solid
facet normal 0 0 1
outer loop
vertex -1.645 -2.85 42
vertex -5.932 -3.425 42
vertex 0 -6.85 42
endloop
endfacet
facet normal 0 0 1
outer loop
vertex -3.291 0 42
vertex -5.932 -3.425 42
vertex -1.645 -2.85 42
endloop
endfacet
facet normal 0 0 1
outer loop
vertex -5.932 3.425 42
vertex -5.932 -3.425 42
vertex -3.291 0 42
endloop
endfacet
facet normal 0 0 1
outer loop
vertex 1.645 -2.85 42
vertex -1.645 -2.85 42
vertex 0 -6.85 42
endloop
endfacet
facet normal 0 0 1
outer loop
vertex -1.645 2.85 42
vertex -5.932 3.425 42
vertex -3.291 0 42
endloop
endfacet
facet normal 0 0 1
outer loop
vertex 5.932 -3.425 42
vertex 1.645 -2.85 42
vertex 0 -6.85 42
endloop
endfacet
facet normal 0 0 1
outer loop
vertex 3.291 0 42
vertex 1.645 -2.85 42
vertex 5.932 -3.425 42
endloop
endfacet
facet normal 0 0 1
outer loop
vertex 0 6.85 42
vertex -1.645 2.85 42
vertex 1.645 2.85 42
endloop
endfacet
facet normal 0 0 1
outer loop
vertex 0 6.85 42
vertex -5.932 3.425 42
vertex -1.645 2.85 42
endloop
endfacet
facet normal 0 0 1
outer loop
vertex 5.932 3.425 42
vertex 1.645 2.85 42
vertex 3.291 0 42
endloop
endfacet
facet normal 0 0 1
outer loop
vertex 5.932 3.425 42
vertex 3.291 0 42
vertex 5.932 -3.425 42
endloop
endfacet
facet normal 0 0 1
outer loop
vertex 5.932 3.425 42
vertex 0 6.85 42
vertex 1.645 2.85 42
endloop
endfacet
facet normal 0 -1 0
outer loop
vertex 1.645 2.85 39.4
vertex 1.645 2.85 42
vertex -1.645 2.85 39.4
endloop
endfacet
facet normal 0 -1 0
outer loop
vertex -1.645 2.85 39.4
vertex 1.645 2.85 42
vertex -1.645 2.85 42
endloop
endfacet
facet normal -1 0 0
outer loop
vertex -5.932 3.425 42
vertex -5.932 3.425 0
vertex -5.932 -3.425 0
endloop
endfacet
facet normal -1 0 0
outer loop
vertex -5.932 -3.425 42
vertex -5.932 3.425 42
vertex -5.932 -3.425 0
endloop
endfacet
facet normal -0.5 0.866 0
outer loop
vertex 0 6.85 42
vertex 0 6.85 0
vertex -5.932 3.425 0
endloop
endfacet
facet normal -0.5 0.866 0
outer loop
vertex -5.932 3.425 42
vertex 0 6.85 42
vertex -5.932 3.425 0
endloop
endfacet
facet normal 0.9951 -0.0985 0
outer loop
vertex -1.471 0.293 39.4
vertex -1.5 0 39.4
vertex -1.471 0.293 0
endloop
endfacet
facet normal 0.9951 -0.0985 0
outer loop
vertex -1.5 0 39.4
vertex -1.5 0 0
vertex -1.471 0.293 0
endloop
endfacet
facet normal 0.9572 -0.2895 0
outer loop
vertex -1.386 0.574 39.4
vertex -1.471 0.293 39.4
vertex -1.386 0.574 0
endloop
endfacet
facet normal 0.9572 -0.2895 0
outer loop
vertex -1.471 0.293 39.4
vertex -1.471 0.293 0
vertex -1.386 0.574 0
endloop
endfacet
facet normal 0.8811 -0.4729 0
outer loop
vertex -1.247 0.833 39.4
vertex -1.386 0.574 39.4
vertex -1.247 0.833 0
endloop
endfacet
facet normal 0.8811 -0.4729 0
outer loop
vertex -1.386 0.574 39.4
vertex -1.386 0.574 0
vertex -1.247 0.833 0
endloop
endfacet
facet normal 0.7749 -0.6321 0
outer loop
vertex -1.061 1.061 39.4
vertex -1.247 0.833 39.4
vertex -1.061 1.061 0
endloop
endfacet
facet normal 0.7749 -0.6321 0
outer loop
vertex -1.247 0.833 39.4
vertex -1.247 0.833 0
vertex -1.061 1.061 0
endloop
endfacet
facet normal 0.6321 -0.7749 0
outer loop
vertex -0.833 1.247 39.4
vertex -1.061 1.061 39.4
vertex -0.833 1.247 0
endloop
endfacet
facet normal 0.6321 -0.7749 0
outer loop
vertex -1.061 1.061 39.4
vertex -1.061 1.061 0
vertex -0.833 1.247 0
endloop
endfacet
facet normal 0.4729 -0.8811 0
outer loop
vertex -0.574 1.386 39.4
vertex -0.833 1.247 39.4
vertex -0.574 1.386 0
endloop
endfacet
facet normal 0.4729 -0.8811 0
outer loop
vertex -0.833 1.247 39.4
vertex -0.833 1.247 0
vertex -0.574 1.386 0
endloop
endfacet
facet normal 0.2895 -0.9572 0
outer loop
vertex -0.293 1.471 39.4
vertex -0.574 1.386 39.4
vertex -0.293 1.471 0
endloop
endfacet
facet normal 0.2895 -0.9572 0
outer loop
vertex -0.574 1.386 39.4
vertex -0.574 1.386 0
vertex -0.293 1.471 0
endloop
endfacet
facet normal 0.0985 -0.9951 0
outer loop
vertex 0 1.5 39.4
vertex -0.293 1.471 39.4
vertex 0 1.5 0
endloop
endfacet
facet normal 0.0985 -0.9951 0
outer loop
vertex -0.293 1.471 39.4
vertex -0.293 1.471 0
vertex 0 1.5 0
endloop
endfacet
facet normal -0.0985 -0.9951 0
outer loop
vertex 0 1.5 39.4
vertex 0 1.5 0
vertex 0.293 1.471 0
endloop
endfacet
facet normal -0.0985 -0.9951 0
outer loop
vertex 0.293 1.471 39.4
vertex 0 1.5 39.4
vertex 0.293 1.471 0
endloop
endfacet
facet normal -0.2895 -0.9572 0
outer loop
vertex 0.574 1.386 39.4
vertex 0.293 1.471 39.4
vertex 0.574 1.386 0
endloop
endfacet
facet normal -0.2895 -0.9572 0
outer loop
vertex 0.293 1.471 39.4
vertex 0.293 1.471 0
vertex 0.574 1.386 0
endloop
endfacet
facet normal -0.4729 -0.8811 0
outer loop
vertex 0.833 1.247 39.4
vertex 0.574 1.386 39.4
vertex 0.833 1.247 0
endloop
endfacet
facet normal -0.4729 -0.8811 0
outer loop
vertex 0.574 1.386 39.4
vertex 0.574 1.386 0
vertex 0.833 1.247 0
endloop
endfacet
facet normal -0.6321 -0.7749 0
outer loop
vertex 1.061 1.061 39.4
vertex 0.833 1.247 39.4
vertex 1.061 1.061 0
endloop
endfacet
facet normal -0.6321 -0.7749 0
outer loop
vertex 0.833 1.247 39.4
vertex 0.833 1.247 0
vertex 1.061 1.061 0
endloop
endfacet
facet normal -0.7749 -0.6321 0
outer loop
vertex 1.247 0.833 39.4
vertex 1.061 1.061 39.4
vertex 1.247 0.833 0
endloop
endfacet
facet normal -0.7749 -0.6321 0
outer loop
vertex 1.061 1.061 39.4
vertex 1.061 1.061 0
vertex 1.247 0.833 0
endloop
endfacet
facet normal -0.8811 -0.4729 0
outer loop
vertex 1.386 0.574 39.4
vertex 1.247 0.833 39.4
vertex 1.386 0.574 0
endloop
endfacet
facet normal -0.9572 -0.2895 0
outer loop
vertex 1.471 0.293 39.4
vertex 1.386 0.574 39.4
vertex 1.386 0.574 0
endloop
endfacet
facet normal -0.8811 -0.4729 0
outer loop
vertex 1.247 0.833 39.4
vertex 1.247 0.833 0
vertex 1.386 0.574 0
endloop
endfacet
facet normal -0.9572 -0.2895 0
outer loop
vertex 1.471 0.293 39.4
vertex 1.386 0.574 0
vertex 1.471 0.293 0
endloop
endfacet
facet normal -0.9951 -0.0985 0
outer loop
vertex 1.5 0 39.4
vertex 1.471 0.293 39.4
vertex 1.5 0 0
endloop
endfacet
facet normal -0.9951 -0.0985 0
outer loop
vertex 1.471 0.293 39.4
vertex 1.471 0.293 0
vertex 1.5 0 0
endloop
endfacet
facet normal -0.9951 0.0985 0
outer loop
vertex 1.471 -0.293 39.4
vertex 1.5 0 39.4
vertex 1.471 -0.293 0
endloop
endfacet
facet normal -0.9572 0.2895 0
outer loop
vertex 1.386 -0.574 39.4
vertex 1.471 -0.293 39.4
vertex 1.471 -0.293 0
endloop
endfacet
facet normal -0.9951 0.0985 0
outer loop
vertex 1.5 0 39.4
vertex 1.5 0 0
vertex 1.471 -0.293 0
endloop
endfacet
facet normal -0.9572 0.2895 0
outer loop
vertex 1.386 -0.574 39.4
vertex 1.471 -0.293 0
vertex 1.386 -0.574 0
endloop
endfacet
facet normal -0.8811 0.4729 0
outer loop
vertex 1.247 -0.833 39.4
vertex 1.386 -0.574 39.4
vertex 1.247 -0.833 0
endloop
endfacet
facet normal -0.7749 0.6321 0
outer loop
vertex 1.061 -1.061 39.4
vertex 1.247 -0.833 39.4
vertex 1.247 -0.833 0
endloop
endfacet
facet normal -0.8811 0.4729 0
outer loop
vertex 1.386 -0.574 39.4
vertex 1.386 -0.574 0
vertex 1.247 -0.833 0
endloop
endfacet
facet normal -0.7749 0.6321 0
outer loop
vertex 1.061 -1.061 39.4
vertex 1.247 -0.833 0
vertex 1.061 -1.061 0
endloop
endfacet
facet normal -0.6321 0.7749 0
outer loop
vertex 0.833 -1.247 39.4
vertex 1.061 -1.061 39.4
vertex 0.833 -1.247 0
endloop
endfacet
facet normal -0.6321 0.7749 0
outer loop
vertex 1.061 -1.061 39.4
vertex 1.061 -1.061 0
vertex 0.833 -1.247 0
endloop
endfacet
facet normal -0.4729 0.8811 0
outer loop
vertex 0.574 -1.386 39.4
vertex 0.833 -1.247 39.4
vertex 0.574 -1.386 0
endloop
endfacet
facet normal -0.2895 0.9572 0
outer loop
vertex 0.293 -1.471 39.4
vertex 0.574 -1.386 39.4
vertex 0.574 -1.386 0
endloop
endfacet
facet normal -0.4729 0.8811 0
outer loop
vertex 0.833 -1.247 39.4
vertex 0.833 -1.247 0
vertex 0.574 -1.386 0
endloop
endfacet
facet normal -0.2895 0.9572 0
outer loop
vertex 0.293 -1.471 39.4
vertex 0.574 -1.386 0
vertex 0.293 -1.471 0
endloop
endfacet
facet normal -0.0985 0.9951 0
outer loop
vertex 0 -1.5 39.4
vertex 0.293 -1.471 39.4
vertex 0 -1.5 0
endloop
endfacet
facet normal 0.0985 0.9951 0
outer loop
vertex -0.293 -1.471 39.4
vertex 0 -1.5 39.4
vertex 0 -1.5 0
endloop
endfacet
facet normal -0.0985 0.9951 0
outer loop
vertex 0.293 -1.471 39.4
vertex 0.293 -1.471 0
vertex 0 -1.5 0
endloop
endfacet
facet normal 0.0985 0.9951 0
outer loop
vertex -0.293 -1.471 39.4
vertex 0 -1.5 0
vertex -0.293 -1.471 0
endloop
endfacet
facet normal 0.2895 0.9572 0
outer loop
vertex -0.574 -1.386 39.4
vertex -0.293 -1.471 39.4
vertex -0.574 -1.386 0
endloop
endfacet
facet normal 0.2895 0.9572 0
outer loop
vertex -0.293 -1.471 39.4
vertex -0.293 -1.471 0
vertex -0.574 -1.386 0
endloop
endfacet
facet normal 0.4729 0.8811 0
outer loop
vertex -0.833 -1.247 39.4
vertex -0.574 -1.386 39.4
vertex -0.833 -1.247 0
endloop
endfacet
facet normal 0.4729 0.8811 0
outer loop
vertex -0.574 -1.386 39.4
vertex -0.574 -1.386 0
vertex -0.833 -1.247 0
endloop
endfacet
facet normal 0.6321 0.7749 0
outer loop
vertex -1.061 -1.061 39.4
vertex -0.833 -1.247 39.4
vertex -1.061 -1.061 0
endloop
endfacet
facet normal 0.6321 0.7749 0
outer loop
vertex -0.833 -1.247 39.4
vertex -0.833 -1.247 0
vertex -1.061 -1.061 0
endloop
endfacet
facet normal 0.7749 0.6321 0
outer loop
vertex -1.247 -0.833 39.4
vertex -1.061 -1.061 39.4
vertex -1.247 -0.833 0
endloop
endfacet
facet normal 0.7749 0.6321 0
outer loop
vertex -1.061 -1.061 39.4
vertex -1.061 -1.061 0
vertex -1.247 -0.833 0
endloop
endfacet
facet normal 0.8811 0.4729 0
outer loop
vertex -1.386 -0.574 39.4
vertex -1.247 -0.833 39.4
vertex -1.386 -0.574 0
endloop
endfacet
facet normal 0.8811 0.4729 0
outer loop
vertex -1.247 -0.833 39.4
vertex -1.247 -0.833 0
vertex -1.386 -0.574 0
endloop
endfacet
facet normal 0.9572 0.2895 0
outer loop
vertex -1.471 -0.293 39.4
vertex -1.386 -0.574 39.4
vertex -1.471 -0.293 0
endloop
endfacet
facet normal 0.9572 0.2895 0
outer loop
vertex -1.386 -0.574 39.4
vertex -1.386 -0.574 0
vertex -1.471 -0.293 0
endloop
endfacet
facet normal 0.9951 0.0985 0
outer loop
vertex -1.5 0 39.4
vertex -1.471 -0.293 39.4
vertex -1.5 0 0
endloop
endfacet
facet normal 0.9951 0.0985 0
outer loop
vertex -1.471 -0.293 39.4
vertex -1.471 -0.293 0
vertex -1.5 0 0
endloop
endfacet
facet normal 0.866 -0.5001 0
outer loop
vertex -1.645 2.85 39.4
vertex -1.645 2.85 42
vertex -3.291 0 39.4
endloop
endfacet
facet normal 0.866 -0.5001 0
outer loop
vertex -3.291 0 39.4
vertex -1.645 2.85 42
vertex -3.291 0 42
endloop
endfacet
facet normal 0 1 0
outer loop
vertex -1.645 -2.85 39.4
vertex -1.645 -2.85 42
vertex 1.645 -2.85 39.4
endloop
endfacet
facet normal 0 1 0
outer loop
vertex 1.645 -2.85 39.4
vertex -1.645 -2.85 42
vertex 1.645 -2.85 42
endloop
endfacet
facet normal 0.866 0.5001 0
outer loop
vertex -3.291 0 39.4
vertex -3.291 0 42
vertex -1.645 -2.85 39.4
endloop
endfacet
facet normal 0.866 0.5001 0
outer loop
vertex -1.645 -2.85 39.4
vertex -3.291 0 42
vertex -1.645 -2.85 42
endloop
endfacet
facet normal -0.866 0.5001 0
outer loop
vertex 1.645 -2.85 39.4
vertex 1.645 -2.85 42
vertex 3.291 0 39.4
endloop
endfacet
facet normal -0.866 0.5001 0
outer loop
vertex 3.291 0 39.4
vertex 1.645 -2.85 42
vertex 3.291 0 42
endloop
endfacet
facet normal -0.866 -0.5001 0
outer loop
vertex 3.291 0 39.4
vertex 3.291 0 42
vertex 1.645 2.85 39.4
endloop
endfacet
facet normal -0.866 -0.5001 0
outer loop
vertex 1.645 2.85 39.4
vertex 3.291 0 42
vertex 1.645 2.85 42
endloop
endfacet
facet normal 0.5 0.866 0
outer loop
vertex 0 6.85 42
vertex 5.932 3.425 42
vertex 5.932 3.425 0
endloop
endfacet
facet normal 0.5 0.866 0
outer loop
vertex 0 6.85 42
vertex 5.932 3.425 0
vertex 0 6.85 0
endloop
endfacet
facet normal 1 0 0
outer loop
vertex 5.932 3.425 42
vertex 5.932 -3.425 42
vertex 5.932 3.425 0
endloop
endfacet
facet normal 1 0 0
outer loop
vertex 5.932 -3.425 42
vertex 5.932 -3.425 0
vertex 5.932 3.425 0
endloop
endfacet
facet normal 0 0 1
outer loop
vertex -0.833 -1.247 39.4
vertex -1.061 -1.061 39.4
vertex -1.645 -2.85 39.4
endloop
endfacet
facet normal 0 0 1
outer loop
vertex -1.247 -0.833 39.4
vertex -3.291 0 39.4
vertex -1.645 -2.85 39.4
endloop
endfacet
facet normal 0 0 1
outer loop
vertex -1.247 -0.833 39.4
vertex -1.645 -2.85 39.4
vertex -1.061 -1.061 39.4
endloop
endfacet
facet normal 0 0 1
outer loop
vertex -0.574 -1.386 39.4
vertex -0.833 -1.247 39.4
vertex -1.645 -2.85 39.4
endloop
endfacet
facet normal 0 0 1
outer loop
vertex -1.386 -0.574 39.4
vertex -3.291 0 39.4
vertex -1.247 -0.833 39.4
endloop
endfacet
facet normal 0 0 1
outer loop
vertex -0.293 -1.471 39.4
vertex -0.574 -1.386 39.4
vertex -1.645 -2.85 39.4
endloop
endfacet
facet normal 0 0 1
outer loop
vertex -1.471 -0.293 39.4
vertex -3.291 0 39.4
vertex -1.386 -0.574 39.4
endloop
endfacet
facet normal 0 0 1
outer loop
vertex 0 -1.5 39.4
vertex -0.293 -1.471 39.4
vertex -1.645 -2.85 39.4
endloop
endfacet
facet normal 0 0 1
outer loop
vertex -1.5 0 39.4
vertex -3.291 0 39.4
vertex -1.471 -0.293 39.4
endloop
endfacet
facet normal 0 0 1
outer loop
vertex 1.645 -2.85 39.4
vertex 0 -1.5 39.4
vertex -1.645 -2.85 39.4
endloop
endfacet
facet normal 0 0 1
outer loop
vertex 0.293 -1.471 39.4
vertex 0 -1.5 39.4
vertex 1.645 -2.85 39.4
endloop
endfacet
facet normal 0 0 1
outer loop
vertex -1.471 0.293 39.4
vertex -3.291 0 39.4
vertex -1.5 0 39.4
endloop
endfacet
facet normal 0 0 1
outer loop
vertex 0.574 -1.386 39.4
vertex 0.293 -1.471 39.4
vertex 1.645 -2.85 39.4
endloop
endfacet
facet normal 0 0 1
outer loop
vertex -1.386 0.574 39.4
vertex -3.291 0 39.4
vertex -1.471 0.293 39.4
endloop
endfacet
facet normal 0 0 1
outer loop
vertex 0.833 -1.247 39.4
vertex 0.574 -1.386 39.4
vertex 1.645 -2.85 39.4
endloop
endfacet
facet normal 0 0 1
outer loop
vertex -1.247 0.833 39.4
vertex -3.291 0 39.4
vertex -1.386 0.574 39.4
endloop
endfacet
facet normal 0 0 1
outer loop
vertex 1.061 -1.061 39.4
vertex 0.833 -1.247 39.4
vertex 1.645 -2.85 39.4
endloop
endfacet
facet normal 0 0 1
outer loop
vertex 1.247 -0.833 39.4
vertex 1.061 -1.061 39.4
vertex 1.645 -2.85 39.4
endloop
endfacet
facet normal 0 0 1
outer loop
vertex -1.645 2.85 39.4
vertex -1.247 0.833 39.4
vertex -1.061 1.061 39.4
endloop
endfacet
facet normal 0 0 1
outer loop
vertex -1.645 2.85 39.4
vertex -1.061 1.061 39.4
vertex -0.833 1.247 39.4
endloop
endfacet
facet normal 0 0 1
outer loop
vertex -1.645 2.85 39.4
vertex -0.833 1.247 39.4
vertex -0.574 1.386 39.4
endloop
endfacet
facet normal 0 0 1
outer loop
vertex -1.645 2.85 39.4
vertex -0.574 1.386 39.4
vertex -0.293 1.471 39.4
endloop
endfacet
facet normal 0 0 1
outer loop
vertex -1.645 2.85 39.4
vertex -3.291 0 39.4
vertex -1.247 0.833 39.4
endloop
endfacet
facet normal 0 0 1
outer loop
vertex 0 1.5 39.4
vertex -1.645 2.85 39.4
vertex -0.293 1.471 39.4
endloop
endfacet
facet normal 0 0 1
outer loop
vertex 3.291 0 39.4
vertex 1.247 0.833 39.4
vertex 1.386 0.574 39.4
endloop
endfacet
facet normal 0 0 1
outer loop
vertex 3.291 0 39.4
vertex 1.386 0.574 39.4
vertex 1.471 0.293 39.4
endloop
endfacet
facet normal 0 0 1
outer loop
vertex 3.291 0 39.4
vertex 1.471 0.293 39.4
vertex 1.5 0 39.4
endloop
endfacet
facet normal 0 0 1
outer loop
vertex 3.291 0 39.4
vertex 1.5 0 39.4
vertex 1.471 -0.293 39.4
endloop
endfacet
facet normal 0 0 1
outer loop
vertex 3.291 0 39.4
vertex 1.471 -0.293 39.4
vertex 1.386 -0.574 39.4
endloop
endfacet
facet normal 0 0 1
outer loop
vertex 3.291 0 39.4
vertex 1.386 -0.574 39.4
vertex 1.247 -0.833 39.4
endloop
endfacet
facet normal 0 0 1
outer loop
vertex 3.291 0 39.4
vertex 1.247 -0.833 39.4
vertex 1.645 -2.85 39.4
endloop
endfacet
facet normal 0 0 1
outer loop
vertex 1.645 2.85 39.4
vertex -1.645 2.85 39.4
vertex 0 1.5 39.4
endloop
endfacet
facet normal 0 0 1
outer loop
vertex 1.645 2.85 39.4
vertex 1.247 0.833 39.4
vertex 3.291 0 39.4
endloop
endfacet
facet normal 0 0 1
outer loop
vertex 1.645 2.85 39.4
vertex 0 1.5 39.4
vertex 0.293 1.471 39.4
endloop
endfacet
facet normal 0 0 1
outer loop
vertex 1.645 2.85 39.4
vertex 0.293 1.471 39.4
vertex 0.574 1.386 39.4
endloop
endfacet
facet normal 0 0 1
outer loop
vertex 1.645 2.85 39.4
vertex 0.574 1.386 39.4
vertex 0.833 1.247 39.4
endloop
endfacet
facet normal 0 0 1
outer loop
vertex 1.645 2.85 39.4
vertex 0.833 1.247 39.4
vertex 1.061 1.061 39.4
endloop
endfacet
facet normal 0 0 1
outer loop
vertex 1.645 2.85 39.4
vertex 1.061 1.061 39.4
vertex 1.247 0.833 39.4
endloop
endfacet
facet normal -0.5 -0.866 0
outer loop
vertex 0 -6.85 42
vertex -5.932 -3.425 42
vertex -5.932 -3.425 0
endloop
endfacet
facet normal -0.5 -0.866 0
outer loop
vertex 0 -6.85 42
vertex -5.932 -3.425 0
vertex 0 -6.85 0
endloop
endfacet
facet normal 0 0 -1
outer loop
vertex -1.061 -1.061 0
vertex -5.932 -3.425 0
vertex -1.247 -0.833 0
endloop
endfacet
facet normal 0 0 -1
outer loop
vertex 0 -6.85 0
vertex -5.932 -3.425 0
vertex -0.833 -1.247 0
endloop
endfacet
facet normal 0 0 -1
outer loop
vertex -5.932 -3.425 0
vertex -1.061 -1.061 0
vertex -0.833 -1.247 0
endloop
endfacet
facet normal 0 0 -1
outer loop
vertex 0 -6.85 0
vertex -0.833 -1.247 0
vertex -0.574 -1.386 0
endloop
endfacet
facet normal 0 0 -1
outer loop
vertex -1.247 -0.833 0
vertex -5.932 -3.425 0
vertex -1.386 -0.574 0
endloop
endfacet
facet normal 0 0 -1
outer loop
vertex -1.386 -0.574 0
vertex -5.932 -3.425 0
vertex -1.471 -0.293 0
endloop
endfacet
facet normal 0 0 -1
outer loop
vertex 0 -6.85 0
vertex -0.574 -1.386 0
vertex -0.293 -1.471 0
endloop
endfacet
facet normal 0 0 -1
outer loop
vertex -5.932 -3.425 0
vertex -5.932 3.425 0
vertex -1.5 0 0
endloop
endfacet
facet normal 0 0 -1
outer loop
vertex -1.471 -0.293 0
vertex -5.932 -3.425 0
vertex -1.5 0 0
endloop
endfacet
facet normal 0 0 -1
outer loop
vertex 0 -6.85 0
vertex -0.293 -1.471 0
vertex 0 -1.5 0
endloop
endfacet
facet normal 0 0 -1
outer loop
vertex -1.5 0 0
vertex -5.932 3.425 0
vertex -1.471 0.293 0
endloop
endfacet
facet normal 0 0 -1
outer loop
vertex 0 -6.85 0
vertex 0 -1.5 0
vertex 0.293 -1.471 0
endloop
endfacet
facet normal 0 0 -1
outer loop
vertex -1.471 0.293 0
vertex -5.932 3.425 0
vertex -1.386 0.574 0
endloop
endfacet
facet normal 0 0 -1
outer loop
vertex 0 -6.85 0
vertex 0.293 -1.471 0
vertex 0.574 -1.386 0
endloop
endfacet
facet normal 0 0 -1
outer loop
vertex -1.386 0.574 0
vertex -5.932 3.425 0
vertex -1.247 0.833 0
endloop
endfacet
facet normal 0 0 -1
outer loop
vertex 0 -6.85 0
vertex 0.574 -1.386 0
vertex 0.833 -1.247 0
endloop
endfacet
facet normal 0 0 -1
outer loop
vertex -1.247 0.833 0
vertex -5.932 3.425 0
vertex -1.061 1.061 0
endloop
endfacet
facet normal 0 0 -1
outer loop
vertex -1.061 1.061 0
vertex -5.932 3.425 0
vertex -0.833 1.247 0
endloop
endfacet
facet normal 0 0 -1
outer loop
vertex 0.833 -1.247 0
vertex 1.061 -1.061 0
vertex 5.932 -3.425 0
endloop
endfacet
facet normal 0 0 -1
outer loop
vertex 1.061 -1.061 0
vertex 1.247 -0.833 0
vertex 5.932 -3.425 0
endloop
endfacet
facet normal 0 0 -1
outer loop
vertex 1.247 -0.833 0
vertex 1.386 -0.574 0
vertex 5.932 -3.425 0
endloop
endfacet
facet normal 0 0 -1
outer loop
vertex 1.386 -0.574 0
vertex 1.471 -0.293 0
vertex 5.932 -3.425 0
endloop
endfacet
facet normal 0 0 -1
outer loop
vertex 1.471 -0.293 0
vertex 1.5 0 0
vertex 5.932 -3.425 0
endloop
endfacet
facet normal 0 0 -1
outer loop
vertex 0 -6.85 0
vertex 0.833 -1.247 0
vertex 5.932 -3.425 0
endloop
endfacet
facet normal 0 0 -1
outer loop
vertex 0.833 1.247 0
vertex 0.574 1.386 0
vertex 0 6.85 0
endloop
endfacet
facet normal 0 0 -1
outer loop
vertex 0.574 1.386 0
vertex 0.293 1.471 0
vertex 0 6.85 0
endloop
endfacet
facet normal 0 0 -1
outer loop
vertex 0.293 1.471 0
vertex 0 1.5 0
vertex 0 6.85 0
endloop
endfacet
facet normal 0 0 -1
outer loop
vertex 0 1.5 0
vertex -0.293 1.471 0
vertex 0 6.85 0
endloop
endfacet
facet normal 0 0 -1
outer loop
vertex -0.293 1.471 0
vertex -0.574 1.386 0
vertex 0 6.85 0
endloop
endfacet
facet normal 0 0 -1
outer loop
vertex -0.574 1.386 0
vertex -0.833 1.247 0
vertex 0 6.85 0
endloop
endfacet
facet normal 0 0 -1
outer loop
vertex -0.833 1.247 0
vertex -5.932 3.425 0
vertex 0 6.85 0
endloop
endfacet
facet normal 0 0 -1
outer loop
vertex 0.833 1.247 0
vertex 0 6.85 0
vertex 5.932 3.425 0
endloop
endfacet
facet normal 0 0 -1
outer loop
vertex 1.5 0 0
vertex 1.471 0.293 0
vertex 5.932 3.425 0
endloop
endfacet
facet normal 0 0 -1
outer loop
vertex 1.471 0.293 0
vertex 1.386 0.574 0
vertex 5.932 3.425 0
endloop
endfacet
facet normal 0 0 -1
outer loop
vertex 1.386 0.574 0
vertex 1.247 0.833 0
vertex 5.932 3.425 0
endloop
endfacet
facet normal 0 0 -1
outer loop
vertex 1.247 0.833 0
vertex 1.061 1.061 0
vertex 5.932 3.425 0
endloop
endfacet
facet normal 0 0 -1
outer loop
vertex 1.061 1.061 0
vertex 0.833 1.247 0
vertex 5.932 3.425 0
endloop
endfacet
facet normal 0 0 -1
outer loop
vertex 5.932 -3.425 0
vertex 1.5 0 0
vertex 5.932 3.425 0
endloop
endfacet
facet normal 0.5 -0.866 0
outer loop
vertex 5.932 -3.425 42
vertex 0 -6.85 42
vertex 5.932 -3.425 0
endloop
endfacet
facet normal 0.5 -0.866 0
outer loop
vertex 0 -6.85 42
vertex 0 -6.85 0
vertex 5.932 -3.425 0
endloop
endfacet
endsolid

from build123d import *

# Parameters (mm, degrees)
F1_DEPTH       = 32
F3_D           = 3
F3_DEPTH       = 40
F3_CBORE_D     = 3
F3_CBORE_DEPTH = 40
F3_TIP         = 0.9012909285
F4_DEPTH       = 10
F6_DEPTH       = 2.6


with BuildPart() as f1:
    # F0 (on Top) → F1 (new body)
    with BuildSketch(Plane.XY):
        Polygon((-5.9322740159, -3.425), (0, -6.85), (5.9322740159, -3.425), (5.9322740159, 3.425), (0, 6.85), (-5.9322740159, 3.425), align=None)
    extrude(amount=F1_DEPTH)

    # F3
    with Locations(Plane.XY.offset(32)):
        with Locations((0, 0)):
            CounterBoreHole(F3_D / 2, F3_CBORE_D / 2, F3_CBORE_DEPTH, depth=F3_DEPTH)
            with Locations((0, 0, -(F3_DEPTH + F3_TIP / 2))):  # 118° drill point
                Cone(0, F3_D / 2, F3_TIP, mode=Mode.SUBTRACT)

    # F4 (add): a face of the model
    f4_faces = [f1.faces().sort_by_distance(p)[0] for p in [
        (-5.7510400511, 0, 32),
    ]]
    extrude(f4_faces, amount=F4_DEPTH)

    # F5 (on face) → F6 (cut)
    with BuildSketch(Plane.XY.offset(42)):
        Polygon((1.6454482672, 2.85), (-1.6454482672, 2.85), (-3.2908965344, 0), (-1.6454482672, -2.85), (1.6454482672, -2.85), (3.2908965344, 0), align=None)
    extrude(amount=-F6_DEPTH, mode=Mode.SUBTRACT)


solid = f1.part
